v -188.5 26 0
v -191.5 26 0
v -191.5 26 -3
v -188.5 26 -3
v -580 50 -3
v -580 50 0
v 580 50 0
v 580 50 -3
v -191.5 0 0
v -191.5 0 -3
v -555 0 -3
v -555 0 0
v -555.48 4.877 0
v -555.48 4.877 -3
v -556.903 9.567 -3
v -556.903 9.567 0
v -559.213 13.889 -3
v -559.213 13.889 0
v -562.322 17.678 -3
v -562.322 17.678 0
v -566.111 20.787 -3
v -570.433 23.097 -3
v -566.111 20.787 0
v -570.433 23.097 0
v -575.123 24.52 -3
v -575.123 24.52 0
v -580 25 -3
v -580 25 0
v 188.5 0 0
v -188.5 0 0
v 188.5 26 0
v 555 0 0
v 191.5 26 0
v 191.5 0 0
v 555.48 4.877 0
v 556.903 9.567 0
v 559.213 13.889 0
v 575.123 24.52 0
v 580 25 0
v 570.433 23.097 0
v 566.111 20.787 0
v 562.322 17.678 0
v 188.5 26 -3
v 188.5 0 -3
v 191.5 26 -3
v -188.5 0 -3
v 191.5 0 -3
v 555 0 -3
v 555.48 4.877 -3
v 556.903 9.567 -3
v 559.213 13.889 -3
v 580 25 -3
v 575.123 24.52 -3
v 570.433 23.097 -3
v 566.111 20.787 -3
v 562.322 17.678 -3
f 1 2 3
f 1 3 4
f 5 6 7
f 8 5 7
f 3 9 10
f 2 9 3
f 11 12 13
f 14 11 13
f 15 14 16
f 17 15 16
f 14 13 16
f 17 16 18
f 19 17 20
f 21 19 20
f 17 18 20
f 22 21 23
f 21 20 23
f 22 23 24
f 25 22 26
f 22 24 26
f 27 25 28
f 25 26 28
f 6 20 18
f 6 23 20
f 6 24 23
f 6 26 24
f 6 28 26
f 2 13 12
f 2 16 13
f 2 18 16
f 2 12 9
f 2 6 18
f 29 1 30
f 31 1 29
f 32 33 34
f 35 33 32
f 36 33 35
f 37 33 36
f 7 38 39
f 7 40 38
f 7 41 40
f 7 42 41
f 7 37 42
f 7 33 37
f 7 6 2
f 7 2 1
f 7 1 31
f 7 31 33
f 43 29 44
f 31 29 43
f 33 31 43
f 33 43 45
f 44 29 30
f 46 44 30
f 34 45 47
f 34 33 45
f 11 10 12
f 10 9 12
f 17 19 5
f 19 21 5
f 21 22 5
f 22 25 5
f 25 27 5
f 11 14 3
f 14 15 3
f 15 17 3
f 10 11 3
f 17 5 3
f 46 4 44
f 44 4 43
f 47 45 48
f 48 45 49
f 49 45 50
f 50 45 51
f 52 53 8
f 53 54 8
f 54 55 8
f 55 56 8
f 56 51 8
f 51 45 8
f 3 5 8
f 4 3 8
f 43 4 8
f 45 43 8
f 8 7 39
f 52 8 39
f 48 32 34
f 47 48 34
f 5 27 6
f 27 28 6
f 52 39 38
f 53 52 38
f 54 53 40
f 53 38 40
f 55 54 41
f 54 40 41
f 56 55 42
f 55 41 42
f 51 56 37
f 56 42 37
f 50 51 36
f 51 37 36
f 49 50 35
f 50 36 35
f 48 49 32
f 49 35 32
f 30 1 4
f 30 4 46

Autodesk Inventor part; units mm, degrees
ref_plane "YZ Plane" through (0, 0, 0) normal (1, 0, 0) x (0, 1, 0)
ref_plane "XZ Plane" through (0, 0, 0) normal (0, 1, 0) x (-1, 0, 0)
ref_plane "XY Plane" through (0, 0, 0) normal (0, 0, 1) x (1, 0, 0)
sketch "Sketch1" plane through (0, 0, 0) normal (0, 0, 1) x (1, 0, 0)
  line L0 (-580, 50) -> (580, 50)
  line L1 (580, 50) -> (580, 0)
  line L2 (580, 0) -> (-580, 0)
  line L3 (-580, 0) -> (-580, 50)
  circle A0 centre (-580, 0) radius 25
  circle A1 centre (580, 0) radius 25
  point P0 (0, 0)
  point P1 (0, 0)
  point P2 (-580, 25)
  point P3 (-555, 0)
  point P4 (555, 0)
  point P5 (580, 25)
  dimension "d16" = 50
  dimension "d17" = 1160
  dimension "d18" = 50
  dimension "d19" = 50
extrude "Plate2" add sketch "Sketch1" against normal blind 3 contours L0 L1 A1 L2 A0 L3
sketch "Sketch2" plane through (0, 0, 0) normal (0, 0, 1) x (1, 0, 0)
  line L0 (-555, 0) -> (555, 0) projected
  line L1 (190, 0) -> (190, 50) construction
  line L2 (580, 50) -> (-580, 50) projected
  line L3 (188.5, 26) -> (191.5, 26)
  line L4 (191.5, 26) -> (191.5, 0)
  line L5 (191.5, 0) -> (188.5, 0)
  line L6 (188.5, 0) -> (188.5, 26)
  line L7 (-190, 50) -> (-190, 0) construction
  line L8 (-191.5, 26) -> (-188.5, 26)
  line L9 (-188.5, 26) -> (-188.5, 0)
  line L10 (-188.5, 0) -> (-191.5, 0)
  line L11 (-191.5, 0) -> (-191.5, 26)
  point P0 (0, 0)
  point P1 (0, 0)
  point P2 (191.5, 0)
  point P3 (0, 0)
  point P4 (-188.5, 0)
  dimension "d21" = 190
  dimension "d22" = 3
  dimension "d23" = 26
  dimension "d29" = 190
  dimension "d30" = 3
  dimension "d31" = 26
extrude "Extrusion1" cut sketch "Sketch2" against normal through all
equation "\"d22\" = Thickness"
equation "\"d29\" = d21"
equation "\"d30\" = Thickness"
equation "\"d31\" = d23"
equation "\"d20\" = Thickness"
equation "\"BendReliefWidth\" = Thickness"
equation "\"BendReliefDepth\" = 0.5 * Thickness"
equation "\"CornerReliefSize\" = 4 * Thickness"
equation "\"MinimumRemnant\" = 2 * Thickness"
equation "\"TransitionRadius\" = BendRadius"
equation "\"JacobiRadiusSize\" = BendRadius"
equation "\"GapSize\" = Thickness"
equation "\"Thickness\" = 3"
equation "\"BendRadius\" = 5"
properties part number "MSC 0563 rib cone" material "Stainless Steel"
